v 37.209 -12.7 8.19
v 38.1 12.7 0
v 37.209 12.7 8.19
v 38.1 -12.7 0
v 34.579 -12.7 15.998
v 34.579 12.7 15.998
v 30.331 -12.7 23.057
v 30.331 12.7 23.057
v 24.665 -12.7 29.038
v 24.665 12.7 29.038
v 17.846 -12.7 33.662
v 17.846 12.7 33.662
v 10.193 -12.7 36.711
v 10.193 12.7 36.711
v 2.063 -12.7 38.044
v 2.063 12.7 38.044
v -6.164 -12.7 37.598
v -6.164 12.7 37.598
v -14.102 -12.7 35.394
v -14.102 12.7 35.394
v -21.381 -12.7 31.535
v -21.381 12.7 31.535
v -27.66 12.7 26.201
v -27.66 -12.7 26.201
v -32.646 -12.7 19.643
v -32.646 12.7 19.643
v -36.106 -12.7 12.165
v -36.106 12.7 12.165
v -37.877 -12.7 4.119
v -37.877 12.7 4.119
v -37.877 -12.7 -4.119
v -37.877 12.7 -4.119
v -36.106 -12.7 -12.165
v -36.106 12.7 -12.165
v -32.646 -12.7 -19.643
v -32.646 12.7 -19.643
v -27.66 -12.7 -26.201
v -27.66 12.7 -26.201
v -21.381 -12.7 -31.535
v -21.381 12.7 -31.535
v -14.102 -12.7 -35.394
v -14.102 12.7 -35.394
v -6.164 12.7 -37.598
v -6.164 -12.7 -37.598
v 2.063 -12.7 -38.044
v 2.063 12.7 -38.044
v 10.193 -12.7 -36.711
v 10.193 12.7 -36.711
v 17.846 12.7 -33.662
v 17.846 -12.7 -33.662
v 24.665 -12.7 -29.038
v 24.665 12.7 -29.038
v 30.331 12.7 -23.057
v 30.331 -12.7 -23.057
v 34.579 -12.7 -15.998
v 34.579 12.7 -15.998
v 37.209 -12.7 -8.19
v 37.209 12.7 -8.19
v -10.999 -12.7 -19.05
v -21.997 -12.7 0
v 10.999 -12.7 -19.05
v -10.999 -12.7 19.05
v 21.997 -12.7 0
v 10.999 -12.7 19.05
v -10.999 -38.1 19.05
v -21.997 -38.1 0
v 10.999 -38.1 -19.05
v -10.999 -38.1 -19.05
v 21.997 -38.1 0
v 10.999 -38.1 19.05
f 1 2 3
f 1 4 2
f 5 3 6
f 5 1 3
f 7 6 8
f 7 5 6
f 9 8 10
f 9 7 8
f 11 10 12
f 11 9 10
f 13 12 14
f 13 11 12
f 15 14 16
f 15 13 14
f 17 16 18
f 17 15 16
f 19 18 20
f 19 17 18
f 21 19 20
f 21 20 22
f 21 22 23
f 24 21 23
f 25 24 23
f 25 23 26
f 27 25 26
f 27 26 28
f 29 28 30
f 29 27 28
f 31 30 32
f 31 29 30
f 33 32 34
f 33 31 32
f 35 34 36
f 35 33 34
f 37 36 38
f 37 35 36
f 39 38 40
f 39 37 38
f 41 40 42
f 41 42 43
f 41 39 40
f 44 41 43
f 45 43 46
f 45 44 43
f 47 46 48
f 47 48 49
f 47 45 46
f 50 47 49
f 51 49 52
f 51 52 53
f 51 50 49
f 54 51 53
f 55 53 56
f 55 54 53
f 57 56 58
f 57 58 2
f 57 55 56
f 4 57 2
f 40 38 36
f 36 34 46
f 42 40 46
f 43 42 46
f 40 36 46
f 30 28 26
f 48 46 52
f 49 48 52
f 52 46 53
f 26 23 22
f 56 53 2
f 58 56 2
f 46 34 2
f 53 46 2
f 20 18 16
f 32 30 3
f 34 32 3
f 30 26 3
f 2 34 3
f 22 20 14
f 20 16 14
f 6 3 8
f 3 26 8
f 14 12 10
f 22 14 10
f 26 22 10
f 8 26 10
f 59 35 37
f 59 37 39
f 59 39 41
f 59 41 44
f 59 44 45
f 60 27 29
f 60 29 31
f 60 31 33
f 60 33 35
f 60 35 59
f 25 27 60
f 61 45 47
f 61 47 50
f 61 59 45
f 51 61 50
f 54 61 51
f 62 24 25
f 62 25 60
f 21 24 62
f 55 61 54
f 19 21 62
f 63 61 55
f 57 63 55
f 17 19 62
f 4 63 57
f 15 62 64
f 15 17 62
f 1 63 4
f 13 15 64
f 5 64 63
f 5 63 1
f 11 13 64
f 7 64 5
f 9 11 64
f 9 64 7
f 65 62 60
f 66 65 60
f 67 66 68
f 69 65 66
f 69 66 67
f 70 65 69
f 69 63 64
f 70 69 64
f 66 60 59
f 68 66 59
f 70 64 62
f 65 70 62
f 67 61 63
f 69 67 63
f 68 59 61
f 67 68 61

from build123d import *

# Parameters (mm, degrees)
F0_R     = 38.1
F1_DEPTH = 12.7
F3_DEPTH = 25.4


with BuildPart() as f1:
    # F0 (on Front) → F1 (new body, symmetric)
    with BuildSketch(Plane.XZ):
        Circle(F0_R)
    extrude(amount=F1_DEPTH, both=True)

    # F2 (on face) → F3 (join)
    with BuildSketch(Plane.XZ.offset(12.7)):
        Polygon((10.9985226281, 19.05), (-10.9985226281, 19.05), (-21.9970452561, 0), (-10.9985226281, -19.05), (10.9985226281, -19.05), (21.9970452561, 0), align=None)
    extrude(amount=F3_DEPTH)


solid = f1.part
